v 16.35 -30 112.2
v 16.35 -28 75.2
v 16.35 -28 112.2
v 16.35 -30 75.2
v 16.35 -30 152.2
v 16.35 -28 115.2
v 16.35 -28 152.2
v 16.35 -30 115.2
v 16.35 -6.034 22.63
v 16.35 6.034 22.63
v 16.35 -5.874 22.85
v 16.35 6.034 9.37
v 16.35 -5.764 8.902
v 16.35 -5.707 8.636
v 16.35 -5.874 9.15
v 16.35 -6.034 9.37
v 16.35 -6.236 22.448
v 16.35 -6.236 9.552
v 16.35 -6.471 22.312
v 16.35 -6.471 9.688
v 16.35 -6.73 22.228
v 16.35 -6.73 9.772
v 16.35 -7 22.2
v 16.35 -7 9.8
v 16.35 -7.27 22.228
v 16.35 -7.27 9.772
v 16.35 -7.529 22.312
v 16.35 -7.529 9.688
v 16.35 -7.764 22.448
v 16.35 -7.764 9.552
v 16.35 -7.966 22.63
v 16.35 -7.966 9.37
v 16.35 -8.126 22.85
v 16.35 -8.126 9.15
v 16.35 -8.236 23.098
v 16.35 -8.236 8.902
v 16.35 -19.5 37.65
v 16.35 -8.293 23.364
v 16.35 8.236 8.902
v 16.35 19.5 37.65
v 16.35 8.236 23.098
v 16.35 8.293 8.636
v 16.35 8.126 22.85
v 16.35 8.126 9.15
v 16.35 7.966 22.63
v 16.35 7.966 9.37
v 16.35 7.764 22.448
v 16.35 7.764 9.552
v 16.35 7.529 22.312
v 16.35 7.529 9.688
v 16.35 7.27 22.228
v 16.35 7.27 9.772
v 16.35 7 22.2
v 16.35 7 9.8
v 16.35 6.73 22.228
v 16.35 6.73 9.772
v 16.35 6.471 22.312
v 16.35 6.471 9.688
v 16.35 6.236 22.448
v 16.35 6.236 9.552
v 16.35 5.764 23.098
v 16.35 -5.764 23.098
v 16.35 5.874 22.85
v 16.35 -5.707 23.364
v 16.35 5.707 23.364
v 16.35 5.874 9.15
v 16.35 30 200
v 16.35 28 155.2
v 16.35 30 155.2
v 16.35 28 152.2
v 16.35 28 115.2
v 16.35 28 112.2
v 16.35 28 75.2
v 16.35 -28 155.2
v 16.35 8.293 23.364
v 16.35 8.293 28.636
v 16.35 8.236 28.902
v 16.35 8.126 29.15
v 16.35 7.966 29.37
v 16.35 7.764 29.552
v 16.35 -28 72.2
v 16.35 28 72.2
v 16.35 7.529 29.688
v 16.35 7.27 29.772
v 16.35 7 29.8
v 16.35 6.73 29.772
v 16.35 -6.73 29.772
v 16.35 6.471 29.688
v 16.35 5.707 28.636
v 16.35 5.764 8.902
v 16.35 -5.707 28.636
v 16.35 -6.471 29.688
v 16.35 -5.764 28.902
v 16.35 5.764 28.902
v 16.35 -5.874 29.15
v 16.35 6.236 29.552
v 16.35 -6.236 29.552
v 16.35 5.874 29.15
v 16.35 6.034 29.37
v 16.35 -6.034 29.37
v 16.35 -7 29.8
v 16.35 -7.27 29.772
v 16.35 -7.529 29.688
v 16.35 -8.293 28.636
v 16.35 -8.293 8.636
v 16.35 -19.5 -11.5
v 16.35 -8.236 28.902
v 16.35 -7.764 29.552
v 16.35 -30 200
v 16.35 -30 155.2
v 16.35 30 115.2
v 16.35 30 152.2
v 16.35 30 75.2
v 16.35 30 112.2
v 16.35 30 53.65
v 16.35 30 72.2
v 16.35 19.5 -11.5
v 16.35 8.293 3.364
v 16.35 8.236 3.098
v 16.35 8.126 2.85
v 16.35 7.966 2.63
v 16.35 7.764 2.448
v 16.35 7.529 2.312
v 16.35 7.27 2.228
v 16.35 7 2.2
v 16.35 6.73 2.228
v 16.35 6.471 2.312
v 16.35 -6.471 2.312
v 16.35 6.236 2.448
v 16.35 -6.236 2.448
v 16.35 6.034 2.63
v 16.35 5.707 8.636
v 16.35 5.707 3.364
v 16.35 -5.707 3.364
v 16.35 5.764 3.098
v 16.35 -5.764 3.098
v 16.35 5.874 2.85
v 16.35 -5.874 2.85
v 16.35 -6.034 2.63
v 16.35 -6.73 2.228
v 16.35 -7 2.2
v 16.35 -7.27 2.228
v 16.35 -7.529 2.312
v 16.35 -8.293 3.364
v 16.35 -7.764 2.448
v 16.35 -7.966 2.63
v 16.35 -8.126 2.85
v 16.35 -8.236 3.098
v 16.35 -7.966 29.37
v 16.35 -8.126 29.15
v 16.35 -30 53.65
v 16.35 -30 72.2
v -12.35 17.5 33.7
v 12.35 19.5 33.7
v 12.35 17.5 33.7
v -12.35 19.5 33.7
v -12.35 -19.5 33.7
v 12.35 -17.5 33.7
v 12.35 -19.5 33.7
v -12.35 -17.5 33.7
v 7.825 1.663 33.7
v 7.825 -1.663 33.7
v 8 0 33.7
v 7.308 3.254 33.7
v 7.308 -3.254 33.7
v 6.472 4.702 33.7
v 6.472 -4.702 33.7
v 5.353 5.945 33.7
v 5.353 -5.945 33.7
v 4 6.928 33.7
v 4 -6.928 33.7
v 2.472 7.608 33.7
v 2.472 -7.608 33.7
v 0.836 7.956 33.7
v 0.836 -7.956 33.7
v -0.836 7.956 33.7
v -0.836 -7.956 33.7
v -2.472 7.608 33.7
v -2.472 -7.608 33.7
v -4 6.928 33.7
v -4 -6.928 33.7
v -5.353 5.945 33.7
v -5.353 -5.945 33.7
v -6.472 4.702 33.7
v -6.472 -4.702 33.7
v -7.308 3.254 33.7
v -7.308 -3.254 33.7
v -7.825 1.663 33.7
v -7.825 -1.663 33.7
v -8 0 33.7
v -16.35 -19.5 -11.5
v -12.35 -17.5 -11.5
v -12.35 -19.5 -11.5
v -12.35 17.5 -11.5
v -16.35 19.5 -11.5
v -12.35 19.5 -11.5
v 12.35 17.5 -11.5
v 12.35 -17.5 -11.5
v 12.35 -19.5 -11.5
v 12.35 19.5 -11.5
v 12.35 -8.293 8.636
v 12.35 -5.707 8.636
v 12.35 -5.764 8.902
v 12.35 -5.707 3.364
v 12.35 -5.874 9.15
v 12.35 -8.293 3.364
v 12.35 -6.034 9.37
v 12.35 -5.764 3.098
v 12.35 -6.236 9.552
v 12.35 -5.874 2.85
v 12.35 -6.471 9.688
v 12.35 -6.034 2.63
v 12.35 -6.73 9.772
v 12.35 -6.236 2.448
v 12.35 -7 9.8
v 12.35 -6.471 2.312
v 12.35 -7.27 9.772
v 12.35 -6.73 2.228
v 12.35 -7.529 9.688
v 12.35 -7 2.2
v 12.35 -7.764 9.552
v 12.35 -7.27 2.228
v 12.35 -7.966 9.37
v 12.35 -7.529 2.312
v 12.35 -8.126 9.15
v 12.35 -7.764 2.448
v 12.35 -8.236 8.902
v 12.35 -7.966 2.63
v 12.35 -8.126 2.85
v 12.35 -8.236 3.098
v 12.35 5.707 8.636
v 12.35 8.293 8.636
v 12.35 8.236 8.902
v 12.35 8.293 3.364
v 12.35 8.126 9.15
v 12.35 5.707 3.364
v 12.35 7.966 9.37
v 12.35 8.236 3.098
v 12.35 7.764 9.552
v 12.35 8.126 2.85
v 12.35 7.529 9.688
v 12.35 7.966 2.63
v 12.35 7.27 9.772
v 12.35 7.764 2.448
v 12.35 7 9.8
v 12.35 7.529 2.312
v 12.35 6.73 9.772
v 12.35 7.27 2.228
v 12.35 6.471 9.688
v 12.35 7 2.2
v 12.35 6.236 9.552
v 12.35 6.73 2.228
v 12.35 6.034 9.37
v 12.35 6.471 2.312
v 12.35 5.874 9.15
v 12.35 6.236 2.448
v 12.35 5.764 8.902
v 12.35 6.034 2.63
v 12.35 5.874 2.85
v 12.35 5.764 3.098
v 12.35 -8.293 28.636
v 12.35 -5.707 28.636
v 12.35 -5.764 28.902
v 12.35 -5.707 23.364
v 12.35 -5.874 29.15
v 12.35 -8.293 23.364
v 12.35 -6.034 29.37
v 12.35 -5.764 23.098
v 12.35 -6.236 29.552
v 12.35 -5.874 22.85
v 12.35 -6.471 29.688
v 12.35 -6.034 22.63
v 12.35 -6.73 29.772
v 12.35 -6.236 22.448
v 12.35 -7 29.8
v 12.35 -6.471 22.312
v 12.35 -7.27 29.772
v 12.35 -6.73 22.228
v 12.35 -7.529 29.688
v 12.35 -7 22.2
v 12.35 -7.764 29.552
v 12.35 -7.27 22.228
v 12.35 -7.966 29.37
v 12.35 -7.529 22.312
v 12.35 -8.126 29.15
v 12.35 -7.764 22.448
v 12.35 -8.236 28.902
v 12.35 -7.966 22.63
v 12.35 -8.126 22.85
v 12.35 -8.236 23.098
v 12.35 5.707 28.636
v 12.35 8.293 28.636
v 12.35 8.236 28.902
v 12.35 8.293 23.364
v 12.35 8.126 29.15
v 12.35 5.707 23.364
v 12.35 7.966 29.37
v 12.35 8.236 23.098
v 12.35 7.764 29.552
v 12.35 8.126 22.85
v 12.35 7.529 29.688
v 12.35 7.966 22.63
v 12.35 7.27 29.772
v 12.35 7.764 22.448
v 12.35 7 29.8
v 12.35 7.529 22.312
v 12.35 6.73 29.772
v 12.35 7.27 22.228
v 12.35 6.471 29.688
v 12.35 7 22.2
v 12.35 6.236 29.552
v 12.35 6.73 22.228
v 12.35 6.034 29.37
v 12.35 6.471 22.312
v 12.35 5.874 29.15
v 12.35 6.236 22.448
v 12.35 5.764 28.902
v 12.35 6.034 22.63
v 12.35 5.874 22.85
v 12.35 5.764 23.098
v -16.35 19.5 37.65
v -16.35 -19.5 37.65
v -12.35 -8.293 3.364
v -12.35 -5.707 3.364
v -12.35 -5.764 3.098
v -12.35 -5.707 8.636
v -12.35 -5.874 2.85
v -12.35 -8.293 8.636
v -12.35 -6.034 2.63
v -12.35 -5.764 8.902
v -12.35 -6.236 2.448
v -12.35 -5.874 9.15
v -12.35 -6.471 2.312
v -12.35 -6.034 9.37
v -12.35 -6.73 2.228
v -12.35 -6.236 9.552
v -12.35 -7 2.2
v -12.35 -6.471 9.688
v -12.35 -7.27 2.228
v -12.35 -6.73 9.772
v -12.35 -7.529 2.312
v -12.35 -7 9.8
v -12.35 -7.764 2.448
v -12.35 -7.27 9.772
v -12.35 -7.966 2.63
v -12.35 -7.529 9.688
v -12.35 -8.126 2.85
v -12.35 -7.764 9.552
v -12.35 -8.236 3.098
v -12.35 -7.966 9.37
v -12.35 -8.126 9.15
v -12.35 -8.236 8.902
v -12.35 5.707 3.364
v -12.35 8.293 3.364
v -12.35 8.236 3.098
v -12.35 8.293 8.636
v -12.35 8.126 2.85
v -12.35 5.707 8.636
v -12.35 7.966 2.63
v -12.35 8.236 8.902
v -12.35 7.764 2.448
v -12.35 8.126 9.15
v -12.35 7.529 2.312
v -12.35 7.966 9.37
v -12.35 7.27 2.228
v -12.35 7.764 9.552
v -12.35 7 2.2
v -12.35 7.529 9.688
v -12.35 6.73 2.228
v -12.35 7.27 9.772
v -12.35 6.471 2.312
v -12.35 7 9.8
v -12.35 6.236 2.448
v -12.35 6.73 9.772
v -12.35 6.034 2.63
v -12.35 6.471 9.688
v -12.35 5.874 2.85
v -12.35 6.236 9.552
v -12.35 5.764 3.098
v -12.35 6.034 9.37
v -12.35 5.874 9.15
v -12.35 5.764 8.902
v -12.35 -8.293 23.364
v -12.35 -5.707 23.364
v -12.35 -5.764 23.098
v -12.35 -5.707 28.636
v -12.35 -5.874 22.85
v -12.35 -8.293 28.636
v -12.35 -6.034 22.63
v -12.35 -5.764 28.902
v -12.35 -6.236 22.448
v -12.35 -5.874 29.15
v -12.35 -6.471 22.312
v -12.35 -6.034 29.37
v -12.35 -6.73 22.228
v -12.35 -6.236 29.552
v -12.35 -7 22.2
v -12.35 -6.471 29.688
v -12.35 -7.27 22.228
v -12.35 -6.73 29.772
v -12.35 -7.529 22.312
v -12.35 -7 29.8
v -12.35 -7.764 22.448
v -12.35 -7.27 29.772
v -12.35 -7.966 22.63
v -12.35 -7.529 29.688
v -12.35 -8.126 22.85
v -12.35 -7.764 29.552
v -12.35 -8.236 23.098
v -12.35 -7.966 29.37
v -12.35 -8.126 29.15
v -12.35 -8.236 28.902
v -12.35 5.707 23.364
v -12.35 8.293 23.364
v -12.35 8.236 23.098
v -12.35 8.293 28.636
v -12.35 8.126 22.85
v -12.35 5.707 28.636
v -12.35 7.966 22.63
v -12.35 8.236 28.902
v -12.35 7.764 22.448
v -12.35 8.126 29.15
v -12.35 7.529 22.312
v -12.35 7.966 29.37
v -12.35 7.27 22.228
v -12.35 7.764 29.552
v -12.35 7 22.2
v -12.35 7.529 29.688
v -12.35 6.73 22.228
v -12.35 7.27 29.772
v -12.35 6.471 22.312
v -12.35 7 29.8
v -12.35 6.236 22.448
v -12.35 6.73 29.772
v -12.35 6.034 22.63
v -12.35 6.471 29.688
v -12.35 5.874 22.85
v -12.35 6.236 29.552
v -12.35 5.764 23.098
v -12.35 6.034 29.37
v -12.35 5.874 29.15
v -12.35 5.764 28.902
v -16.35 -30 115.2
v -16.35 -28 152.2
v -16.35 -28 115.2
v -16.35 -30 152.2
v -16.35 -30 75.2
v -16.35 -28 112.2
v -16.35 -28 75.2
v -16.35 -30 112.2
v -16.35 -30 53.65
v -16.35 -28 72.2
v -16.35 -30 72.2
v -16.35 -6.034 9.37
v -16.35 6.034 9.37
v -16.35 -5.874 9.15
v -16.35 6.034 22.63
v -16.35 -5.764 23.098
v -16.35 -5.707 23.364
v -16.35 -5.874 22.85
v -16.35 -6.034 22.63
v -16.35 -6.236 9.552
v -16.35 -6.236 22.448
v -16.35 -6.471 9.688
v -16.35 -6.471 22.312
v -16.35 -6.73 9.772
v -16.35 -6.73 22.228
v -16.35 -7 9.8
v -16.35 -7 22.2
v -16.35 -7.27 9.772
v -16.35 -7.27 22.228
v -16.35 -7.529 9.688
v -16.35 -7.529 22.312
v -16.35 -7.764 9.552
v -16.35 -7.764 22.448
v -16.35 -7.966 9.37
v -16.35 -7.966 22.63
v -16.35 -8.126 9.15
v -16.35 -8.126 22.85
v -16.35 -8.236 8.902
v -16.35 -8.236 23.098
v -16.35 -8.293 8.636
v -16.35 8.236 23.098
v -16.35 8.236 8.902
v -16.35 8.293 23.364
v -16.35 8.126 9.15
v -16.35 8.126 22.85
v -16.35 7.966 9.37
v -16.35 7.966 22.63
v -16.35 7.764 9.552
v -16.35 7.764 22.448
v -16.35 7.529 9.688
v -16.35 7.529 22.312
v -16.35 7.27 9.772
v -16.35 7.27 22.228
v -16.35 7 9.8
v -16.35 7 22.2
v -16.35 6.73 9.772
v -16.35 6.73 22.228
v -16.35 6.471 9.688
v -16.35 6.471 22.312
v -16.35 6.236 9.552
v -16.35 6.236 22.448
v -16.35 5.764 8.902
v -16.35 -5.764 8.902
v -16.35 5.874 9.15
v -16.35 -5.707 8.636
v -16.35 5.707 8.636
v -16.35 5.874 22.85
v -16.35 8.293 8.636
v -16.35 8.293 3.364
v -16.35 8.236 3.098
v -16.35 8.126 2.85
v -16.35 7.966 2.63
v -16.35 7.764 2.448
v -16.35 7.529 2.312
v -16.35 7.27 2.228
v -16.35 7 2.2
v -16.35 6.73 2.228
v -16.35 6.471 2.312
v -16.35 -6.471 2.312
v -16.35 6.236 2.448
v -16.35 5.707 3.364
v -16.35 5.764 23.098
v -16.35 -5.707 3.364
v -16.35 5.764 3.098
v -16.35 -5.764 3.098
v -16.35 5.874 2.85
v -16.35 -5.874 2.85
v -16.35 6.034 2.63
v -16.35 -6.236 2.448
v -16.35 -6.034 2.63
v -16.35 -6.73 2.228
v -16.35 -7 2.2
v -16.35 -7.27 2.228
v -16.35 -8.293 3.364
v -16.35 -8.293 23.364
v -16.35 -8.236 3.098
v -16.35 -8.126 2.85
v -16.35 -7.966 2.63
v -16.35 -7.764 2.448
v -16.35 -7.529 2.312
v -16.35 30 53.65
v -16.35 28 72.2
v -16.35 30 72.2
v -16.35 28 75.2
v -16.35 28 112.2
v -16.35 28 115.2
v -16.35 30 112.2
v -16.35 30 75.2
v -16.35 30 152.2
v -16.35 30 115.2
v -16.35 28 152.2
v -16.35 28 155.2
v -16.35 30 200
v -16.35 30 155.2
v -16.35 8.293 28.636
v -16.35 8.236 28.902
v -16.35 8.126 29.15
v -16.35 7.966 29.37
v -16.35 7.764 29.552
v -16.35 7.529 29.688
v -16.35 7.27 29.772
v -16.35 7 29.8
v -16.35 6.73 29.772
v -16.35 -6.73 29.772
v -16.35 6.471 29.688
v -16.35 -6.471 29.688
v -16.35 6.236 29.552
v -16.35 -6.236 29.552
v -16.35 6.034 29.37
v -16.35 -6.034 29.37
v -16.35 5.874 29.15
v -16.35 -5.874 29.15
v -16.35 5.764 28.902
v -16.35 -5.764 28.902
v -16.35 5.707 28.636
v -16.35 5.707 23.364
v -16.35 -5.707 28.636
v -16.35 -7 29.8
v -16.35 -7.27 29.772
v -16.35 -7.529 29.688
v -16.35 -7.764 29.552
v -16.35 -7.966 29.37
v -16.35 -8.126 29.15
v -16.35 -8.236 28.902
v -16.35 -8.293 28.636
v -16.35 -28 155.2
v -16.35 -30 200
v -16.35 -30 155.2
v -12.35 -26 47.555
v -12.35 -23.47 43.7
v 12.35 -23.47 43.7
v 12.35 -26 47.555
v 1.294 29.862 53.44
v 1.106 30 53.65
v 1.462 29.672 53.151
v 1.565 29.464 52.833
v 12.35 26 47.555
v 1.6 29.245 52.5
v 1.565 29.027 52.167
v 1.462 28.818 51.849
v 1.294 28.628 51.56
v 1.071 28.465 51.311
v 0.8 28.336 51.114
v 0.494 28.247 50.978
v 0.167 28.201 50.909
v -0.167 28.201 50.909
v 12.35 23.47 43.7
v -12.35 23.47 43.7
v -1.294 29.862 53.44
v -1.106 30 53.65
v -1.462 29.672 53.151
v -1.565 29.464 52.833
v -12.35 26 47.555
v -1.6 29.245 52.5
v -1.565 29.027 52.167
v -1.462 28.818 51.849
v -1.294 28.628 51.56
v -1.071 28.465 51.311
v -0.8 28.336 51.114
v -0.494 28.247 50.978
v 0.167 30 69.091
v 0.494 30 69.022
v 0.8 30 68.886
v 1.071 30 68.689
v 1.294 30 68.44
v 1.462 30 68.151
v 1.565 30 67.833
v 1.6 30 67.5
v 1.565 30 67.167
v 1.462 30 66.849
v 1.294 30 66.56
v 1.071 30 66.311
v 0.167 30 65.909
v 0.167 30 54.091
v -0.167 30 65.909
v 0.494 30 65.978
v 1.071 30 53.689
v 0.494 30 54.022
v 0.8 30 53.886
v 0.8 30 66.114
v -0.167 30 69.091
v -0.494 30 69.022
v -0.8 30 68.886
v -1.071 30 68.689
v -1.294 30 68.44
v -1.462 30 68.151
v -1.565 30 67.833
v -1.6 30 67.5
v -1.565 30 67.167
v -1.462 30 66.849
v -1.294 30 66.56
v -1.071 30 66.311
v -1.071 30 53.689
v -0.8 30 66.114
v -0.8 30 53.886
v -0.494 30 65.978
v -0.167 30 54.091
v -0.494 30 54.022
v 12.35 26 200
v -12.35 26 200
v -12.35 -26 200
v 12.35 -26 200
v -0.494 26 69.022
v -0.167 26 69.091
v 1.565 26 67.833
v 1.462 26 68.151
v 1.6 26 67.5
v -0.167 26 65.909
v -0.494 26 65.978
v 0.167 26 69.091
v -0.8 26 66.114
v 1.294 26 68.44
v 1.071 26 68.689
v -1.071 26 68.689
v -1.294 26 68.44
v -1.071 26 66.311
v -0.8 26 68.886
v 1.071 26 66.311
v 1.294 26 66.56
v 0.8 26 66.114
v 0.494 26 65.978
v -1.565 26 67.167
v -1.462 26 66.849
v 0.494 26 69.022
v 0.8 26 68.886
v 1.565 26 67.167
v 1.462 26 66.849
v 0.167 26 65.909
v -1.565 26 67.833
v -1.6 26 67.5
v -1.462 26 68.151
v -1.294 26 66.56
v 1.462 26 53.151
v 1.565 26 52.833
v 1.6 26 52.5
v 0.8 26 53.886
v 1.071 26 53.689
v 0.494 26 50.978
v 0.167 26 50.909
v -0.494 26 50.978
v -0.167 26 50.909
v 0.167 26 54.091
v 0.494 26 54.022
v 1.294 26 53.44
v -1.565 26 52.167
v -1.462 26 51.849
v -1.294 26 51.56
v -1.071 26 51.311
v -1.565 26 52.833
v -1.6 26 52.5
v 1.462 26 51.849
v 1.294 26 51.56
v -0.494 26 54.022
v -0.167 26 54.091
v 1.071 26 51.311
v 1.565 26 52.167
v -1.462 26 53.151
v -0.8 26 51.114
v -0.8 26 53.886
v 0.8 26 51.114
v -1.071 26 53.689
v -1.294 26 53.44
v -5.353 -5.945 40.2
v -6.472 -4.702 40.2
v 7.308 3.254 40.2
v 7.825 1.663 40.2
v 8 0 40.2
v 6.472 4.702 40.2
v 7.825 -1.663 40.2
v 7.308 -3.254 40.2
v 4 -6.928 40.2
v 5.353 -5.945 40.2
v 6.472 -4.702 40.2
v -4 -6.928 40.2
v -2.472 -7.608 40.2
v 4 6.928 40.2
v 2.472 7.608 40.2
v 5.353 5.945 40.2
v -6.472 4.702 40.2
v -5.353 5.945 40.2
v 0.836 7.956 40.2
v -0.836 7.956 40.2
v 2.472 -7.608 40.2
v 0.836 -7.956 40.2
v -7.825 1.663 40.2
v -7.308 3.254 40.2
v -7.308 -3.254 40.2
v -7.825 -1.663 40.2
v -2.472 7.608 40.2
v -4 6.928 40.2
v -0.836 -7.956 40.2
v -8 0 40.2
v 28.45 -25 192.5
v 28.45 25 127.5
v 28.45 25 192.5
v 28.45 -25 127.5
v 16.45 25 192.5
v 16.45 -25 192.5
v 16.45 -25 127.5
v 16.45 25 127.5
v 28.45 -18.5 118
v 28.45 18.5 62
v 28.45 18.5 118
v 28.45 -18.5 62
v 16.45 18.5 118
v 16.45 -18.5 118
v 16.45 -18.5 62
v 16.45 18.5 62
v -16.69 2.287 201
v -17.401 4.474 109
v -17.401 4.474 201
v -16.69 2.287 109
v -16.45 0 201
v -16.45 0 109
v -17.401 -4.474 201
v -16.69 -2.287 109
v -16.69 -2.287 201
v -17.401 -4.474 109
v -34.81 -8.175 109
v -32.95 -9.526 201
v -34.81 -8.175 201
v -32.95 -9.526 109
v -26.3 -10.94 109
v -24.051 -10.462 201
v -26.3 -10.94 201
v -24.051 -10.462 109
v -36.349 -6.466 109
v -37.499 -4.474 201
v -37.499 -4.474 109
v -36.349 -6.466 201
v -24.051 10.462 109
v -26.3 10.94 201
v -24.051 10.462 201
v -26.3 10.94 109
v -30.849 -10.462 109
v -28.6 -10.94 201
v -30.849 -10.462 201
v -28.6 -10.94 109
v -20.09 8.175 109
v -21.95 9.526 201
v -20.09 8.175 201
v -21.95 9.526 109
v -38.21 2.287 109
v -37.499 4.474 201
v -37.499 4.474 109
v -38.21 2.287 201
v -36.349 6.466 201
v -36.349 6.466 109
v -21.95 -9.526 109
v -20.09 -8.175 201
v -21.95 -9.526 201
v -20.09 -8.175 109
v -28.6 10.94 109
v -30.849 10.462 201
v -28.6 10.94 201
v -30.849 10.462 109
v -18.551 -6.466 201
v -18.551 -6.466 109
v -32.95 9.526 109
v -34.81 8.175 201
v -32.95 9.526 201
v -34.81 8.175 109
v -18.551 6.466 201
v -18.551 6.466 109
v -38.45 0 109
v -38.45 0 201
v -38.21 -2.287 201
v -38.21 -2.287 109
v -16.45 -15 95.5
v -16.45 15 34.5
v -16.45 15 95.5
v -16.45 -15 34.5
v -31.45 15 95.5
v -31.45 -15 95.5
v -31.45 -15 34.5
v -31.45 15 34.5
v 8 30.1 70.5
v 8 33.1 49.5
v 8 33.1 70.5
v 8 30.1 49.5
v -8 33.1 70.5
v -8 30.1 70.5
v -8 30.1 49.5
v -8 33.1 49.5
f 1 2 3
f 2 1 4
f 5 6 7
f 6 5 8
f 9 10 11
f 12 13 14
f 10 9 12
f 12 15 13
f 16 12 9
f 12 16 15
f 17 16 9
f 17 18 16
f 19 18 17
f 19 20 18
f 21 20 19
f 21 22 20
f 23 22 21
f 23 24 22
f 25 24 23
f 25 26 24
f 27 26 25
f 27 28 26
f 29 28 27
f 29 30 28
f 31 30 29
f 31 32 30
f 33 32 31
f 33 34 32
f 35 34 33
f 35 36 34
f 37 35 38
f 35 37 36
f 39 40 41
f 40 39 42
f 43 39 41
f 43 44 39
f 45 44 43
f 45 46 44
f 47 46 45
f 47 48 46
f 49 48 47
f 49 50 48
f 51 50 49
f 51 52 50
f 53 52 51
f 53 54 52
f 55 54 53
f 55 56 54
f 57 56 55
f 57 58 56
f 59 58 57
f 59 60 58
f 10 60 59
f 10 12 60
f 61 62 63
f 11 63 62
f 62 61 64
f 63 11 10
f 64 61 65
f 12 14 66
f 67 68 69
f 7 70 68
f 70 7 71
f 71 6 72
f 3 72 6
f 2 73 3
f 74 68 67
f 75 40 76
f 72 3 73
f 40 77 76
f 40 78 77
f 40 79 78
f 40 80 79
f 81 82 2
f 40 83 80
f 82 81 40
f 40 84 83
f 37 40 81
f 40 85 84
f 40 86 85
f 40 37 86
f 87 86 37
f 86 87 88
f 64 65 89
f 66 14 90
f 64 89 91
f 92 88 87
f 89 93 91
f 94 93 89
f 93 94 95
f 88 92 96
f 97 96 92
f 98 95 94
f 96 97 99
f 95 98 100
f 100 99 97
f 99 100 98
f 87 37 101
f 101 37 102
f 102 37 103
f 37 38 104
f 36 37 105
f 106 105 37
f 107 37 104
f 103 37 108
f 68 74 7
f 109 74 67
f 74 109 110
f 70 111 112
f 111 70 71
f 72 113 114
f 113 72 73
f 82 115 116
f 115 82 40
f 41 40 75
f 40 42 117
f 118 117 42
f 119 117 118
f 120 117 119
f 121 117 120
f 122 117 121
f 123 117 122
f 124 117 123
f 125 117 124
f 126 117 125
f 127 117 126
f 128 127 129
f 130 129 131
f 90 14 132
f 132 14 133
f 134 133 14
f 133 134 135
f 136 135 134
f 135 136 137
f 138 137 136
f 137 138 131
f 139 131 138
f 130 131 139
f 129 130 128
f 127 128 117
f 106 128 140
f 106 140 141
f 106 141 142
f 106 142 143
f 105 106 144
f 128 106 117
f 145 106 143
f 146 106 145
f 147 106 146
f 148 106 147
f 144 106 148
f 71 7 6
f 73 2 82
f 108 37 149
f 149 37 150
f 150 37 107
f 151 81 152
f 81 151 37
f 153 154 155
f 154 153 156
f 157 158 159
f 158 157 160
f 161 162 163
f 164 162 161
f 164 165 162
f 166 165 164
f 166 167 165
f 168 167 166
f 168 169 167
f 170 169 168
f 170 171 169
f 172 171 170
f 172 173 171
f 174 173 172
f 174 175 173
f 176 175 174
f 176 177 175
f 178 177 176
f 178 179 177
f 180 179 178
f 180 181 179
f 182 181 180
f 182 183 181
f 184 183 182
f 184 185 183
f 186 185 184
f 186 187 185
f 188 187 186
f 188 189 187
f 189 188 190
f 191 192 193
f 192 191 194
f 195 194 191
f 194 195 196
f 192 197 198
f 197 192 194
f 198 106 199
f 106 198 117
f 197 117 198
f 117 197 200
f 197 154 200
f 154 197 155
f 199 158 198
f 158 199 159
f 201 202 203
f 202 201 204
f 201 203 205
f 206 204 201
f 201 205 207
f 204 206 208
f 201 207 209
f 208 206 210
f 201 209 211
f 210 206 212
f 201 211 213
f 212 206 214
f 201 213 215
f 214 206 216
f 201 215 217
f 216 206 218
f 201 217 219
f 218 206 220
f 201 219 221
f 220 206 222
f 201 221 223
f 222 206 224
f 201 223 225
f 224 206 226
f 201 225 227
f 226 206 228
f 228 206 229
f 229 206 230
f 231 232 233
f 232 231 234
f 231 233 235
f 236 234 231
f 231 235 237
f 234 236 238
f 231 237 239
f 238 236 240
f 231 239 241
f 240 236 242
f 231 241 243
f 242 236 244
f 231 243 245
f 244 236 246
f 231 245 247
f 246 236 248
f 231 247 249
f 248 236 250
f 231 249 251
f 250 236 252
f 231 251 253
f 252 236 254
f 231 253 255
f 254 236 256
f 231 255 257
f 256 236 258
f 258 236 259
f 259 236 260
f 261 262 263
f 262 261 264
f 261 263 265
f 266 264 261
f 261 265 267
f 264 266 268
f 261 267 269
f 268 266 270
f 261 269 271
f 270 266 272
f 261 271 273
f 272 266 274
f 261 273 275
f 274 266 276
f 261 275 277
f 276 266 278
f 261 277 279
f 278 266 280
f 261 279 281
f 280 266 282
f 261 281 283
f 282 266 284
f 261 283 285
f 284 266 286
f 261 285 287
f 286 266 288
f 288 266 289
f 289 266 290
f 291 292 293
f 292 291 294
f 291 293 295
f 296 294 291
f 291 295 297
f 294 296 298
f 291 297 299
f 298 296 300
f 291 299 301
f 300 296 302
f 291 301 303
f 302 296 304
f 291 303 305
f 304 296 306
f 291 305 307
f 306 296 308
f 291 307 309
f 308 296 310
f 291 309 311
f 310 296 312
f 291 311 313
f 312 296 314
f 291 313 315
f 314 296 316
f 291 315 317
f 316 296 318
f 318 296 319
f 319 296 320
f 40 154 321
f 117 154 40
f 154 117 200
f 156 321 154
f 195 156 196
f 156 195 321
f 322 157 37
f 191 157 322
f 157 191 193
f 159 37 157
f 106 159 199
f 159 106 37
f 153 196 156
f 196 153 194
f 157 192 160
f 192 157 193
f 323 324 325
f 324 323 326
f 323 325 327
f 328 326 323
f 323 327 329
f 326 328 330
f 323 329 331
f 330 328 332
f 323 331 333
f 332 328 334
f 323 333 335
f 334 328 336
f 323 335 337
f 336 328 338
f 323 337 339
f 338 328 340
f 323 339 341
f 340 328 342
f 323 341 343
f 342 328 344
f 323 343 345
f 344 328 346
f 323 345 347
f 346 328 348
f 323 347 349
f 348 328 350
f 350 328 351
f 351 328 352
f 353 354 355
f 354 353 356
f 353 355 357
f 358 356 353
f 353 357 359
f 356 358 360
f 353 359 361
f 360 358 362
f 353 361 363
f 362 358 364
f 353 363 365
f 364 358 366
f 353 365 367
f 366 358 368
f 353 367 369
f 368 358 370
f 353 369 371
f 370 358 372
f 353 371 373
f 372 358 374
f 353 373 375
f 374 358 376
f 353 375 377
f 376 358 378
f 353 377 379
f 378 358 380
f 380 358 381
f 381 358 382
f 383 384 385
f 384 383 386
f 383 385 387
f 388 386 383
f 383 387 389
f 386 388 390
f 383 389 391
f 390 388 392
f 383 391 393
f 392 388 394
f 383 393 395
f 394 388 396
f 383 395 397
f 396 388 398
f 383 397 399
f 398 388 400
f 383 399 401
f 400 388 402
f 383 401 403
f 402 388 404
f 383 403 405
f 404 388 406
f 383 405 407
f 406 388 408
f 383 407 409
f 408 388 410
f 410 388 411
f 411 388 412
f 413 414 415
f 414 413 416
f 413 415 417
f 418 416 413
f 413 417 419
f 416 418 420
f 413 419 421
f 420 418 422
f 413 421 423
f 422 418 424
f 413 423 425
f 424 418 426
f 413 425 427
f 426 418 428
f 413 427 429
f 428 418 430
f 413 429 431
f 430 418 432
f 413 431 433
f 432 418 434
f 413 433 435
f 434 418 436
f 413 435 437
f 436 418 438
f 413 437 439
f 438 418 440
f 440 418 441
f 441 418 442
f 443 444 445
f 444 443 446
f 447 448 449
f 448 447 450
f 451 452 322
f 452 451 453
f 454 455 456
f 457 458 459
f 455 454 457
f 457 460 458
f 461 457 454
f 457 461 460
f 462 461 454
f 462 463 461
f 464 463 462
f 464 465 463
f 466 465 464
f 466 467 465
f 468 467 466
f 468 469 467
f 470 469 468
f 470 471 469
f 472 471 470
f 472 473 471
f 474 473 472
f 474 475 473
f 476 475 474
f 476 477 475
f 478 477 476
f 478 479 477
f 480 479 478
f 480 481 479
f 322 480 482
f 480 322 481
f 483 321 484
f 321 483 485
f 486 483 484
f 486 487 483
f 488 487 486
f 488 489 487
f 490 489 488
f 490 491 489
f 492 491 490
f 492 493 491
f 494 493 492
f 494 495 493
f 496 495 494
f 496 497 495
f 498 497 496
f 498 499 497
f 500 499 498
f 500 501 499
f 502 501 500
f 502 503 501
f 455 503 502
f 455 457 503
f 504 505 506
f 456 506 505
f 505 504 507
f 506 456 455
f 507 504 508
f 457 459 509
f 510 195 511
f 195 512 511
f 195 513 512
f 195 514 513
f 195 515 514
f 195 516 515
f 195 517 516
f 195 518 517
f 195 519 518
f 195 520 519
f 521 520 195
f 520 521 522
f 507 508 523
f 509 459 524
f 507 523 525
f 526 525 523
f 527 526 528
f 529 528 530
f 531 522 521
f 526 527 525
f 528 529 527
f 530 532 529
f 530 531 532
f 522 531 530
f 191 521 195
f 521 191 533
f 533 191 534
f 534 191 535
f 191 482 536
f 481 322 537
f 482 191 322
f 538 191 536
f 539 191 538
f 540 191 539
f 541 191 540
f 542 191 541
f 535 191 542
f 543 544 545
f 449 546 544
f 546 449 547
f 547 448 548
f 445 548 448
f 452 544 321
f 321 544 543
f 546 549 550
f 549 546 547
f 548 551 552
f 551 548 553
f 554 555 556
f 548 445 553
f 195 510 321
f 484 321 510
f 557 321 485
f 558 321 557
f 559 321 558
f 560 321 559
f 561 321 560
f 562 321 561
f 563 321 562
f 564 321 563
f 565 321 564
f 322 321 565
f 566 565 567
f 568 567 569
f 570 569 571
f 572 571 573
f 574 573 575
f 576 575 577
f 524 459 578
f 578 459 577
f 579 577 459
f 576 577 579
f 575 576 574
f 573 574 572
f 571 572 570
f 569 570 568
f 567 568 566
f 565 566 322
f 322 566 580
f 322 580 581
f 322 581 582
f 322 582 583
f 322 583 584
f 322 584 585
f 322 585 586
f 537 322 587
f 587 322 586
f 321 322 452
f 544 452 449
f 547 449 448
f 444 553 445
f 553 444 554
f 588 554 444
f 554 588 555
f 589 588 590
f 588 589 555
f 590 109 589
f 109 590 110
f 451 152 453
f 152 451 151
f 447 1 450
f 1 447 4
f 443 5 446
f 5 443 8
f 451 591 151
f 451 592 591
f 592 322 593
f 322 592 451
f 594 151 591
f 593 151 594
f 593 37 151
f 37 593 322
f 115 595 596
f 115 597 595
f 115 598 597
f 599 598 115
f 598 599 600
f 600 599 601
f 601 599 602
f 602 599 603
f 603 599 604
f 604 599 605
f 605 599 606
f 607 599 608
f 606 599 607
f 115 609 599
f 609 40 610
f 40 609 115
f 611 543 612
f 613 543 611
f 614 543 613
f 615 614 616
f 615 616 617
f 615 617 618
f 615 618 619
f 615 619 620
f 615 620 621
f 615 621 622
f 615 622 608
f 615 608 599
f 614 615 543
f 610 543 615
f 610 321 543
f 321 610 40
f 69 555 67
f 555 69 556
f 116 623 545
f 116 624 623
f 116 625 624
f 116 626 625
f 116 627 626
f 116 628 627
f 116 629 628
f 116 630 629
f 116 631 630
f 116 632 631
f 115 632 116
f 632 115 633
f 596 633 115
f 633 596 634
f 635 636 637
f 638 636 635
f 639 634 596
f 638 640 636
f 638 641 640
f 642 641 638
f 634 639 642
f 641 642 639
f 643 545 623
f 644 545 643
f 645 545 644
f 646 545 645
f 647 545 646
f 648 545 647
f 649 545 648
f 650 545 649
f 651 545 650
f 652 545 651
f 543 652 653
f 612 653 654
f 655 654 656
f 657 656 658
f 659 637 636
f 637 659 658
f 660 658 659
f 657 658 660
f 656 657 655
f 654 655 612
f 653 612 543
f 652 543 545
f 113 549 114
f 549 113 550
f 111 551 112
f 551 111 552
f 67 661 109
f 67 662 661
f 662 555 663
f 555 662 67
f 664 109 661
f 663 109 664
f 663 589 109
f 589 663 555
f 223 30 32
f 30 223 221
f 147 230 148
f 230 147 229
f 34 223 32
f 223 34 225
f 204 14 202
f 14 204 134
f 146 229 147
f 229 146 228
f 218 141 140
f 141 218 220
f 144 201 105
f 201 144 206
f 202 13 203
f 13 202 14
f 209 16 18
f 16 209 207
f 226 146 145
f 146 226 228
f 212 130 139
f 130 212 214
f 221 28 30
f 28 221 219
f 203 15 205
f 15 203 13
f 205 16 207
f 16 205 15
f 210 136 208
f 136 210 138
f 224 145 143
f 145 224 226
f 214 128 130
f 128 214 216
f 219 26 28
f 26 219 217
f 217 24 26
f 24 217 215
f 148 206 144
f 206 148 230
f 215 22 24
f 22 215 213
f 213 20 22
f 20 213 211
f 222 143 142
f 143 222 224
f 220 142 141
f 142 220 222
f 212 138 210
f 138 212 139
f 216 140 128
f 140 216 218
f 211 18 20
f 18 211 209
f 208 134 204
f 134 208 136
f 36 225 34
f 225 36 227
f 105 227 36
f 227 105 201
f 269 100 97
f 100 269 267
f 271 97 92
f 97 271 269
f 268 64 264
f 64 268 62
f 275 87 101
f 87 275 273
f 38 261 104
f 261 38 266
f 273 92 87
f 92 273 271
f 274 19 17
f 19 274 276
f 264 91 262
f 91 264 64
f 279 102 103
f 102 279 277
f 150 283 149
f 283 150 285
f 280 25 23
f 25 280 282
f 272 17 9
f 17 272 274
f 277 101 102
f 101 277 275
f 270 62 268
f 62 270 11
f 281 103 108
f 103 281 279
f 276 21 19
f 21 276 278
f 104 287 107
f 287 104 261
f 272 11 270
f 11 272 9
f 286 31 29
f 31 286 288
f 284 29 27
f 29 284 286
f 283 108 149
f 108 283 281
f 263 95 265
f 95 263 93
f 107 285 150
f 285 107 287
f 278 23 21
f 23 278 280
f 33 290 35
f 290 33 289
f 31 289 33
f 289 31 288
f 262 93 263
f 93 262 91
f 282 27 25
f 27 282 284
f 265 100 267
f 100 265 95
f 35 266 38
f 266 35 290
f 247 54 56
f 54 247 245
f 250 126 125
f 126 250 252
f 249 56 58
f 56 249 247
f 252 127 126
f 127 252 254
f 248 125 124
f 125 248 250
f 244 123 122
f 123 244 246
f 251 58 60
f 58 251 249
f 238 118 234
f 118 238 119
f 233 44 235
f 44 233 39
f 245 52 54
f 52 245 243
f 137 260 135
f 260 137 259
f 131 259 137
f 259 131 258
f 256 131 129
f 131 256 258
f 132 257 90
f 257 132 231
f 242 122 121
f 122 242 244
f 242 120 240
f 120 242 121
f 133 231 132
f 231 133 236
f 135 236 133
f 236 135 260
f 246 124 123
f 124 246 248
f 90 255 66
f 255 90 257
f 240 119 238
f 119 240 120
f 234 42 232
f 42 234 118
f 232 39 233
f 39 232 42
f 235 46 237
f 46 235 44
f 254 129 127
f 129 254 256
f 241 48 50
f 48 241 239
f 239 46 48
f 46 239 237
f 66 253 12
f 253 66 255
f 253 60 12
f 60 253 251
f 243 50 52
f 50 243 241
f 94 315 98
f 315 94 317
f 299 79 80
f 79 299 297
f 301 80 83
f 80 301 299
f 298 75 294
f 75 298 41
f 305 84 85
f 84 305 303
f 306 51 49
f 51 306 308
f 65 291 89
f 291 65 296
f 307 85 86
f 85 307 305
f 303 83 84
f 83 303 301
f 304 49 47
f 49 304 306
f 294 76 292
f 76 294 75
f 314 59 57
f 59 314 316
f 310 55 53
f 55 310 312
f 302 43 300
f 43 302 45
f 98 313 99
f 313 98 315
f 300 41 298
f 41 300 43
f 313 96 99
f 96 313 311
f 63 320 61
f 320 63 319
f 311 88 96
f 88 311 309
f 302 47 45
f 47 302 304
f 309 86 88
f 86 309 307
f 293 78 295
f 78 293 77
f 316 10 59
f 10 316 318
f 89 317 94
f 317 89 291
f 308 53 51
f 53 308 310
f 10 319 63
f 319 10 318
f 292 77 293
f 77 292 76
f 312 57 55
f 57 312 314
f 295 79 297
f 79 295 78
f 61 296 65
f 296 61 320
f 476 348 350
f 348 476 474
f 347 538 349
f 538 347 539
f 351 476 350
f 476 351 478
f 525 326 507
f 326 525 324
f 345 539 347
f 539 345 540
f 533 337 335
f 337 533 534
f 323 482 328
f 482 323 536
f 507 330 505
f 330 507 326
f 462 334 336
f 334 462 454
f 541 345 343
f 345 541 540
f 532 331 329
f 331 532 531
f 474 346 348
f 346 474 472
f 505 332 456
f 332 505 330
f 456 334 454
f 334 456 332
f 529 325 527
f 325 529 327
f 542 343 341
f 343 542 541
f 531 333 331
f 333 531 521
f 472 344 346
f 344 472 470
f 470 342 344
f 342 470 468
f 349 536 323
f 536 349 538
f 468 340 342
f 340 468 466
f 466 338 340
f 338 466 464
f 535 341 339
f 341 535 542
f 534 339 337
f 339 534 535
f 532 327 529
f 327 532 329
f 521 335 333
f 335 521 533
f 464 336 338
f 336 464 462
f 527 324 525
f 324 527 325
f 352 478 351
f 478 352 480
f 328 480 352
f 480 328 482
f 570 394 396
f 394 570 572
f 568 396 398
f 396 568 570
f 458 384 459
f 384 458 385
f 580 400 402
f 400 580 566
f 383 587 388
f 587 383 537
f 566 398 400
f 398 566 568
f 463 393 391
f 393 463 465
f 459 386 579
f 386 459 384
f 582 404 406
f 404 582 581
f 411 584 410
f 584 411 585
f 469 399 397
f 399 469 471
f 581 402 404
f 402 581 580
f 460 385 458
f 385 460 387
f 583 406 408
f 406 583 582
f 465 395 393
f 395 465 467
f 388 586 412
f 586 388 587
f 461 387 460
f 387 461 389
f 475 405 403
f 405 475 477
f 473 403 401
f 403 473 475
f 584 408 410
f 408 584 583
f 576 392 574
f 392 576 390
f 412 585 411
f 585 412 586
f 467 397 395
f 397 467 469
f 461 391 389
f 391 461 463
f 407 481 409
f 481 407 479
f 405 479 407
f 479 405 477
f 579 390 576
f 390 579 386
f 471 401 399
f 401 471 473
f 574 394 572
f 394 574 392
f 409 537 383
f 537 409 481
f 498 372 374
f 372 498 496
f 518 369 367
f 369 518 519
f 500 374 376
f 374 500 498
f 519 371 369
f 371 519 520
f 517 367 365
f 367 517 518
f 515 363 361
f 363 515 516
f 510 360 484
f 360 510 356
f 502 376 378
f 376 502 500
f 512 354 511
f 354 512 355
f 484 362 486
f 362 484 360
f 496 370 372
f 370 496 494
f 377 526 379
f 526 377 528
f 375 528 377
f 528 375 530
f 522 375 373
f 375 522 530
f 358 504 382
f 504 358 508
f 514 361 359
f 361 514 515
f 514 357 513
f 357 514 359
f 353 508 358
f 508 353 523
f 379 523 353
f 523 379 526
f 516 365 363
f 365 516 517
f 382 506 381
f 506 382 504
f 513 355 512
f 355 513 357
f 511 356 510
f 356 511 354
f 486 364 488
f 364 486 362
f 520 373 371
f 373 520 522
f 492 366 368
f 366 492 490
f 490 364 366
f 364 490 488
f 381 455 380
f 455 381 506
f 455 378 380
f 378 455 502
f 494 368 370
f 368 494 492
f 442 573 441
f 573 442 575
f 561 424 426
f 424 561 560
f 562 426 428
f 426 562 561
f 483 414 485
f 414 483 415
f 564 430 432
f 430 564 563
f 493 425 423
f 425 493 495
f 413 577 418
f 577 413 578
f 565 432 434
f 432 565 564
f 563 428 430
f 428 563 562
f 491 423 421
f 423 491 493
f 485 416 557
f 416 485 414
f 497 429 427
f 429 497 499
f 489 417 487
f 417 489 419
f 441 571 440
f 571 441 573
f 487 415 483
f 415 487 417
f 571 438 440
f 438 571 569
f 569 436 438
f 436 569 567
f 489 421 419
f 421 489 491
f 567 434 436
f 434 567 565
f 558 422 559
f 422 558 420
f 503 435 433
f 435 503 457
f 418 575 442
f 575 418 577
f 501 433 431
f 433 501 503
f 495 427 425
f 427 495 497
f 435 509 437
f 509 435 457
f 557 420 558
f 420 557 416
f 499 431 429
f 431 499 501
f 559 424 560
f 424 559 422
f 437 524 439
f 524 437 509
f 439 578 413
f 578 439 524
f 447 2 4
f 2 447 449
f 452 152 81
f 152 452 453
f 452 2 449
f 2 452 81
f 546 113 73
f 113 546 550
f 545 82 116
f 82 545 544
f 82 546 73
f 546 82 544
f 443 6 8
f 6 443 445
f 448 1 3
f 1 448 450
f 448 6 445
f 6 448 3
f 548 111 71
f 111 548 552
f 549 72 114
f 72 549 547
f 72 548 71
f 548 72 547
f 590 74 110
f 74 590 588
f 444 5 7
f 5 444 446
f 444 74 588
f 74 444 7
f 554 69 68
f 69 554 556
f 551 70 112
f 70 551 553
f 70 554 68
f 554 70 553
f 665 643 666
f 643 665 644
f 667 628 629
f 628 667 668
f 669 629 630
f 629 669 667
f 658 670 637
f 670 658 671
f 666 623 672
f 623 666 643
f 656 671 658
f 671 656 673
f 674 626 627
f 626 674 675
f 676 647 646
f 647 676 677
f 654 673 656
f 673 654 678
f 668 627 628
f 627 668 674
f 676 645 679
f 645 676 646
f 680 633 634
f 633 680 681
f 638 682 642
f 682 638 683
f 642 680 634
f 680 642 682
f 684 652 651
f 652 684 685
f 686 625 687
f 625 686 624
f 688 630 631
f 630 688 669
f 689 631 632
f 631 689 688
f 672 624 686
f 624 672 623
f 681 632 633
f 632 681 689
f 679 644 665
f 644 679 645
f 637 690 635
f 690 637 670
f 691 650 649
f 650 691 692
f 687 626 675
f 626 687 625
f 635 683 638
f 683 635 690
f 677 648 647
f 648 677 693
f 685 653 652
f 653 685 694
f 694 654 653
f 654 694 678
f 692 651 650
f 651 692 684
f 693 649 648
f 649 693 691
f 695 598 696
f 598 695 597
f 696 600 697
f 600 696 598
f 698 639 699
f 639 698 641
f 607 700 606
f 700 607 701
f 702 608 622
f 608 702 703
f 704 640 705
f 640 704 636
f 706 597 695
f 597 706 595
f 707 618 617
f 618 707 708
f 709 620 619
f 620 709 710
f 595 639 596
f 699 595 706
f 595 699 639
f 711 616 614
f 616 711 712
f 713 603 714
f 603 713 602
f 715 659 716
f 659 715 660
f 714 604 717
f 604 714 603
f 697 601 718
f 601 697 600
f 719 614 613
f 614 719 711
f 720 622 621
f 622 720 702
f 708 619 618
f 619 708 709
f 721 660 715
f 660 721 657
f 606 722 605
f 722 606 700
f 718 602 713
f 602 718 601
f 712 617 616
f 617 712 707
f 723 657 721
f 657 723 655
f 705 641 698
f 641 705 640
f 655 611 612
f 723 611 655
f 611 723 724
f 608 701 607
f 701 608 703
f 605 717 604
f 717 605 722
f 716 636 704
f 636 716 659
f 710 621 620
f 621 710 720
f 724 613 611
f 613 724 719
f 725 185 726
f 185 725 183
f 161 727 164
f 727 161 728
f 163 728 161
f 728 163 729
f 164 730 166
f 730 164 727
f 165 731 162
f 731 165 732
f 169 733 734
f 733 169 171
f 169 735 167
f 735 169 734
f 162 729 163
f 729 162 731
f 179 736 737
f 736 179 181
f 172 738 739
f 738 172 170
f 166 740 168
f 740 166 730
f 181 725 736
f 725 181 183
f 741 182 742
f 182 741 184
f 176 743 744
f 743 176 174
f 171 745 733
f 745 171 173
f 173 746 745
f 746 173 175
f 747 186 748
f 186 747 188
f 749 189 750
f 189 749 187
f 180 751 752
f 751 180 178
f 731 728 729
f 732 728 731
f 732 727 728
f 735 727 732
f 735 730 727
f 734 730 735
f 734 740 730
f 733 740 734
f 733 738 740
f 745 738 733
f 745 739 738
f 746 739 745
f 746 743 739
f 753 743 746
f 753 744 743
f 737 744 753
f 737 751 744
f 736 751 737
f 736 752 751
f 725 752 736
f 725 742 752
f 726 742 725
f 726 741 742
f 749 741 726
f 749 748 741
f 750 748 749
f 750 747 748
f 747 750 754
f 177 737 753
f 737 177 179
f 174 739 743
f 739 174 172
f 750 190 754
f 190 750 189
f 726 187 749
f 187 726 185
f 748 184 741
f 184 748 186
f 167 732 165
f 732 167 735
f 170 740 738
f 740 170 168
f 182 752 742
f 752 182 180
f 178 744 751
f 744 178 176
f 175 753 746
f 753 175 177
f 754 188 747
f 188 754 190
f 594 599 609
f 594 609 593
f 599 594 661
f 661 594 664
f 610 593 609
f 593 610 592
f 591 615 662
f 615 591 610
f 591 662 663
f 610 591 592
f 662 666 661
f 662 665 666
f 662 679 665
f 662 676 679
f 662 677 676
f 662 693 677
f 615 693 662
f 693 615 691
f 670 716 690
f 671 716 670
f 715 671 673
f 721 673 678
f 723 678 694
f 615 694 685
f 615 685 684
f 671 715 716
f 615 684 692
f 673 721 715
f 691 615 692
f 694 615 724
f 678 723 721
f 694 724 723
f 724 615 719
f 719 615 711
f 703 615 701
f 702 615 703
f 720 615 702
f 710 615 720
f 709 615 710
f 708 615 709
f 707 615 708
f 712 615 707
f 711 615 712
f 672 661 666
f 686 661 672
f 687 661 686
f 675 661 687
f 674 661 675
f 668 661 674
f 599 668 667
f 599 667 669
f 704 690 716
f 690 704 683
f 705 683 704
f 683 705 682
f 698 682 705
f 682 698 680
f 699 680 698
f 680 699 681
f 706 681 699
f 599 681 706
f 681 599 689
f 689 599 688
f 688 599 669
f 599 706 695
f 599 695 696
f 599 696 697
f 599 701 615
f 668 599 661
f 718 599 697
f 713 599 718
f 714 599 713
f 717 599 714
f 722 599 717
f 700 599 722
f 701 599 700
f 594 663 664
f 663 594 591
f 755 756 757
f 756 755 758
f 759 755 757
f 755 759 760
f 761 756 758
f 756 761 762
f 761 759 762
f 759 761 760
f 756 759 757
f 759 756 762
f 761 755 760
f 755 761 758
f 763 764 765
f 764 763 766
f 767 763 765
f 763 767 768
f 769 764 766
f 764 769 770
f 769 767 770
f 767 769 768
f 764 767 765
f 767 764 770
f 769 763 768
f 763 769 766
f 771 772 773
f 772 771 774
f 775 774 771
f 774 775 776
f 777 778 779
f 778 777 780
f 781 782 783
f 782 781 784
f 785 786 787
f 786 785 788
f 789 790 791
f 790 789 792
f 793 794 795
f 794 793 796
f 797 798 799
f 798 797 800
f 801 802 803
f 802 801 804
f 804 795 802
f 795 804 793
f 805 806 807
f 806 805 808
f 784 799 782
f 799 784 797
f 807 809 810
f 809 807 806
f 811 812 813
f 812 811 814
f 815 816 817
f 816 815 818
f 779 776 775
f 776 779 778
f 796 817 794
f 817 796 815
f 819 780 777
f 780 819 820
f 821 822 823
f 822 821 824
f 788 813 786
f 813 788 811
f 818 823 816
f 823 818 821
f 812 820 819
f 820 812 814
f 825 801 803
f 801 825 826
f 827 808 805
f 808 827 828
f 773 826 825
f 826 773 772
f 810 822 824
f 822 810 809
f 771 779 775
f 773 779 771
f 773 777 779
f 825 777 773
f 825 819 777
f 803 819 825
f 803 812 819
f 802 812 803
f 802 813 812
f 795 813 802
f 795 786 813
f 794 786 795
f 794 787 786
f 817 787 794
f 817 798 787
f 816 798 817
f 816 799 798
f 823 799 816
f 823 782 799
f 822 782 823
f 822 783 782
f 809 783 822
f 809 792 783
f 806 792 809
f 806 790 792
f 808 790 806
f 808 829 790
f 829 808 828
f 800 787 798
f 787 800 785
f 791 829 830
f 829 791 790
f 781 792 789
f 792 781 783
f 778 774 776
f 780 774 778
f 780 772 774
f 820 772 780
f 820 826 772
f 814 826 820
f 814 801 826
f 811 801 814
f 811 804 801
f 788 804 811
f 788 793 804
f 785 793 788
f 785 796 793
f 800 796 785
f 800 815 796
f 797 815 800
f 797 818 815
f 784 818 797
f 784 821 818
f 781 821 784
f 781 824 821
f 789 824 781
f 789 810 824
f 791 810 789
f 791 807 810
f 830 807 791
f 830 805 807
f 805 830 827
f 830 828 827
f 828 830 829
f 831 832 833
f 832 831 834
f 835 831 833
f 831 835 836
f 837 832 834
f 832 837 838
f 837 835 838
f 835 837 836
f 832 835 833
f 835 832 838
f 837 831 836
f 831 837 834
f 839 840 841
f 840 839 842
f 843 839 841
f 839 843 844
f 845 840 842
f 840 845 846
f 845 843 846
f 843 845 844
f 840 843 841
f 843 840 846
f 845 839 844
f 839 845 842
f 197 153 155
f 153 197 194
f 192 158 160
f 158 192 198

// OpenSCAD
/*
  2026 전람회 "줄타기 밸런싱 로봇" - PyBullet 시뮬레이션 전용 모델
  - 목적: 물리 엔진(URDF) 업로드를 위한 강체(Rigid Body) Mesh 생성
  - export_mode = 1 : 상체 덩어리 (프레임+모터바디+보드x2+배터리x2+센서)
  - export_mode = 2 : 하체 덩어리 (프레임+금속브라켓+모터혼+센서)
  - 조치사항: 전선 및 가상의 나사 핀 제거, 부품 통짜 Union 병합
*/

$fn = 30; // 시뮬레이터 연산 부하를 줄이기 위해 곡면 해상도를 30으로 최적화

// ==========================================
// 🚀 STL Export 설정 (매우 중요)
// ==========================================
// ⭐ 1로 설정하고 F6 누른 뒤 STL 저장 -> upper_link.stl
// ⭐ 2로 설정하고 F6 누른 뒤 STL 저장 -> lower_link.stl
// (0으로 설정하면 조립된 모습을 미리보기 할 수 있습니다.)
export_mode = 1; 

// ==========================================
// ⚙️ 하드웨어 치수 파라미터 
// ==========================================
upper_length = 200; lower_length = 200; col_y_target = 60.0; 

// [모터 및 브라켓]
motor_x = 24.7; motor_y = 35.0; motor_z_up = 33.7; motor_z_down = 11.5; motor_z = 45.2;
m_hole_y = 14.0; m_hole_z_positions = [6.0, 26.0]; 
horn_d = 20.0; horn_h = 3.0;

b_inner_y = 42.0; b_w = 24.0; b_arm_l = 30.0; b_thick = 2.0; 
b_hole_x = 14.0; b_hole_y = 20.0; 
rope_d = 2.0; 

// [전자부품 실측]
esp_w = 50.0; esp_h = 65.0; esp_d = 12.0;
urt_w = 37.0; urt_h = 56.0; urt_d = 12.0;
bat_w = 30.0; bat_h = 61.0; bat_d = 15.0;
pb_d  = 22.0; pb_h  = 92.0;
mpu_w = 16.0; mpu_h = 21.0; mpu_d = 3.0;

plate_t = 4.0; 
up_x_fixed = motor_x + (plate_t * 2); 
low_x_fixed = b_w;                    
b_bot_z = -b_arm_l - b_thick;

// ==========================================
// 👁️ 메인 병합 로직
// ==========================================
if (export_mode == 1) {
    // [상체 강체 그룹]
    union() {
        upper_body_mesh();         
        motor_body_mesh();         
        upper_electronics_mesh();  
    }
} else if (export_mode == 2) {
    // [하체 강체 그룹]
    union() {
        lower_body_mesh();         
        bracket_mesh();            
        horn_mesh();               
        lower_electronics_mesh();  
    }
} else if (export_mode == 0) {
    // [어셈블리 미리보기]
    color("LightSkyBlue") { upper_body_mesh(); motor_body_mesh(); upper_electronics_mesh(); }
    color("DimGray") { lower_body_mesh(); bracket_mesh(); horn_mesh(); lower_electronics_mesh(); }
}

// ==========================================
// 🧱 세부 파트 모델링 (물리 충돌 특성 유지를 위해 뼈대 구멍은 보존)
// ==========================================
module upper_body_mesh() {
    difference() {
        union() {
            z_center = (motor_z_up - motor_z_down)/2;
            translate([motor_x/2 + plate_t/2, 0, z_center]) cube([plate_t, motor_y + 4, motor_z], center=true);
            translate([-motor_x/2 - plate_t/2, 0, z_center]) cube([plate_t, motor_y + 4, motor_z], center=true);
            translate([0, 0, motor_z_up + plate_t/2]) cube([up_x_fixed, motor_y + 4, plate_t], center=true);
            hull() {
                translate([0, 0, motor_z_up + plate_t]) cube([up_x_fixed, motor_y + 4, 0.1], center=true);
                translate([0, 0, motor_z_up + 20]) cube([up_x_fixed, col_y_target, 0.1], center=true);
            }
            h_len = upper_length - (motor_z_up + 20);
            translate([0, 0, motor_z_up + 20 + h_len/2]) cube([up_x_fixed, col_y_target, h_len], center=true);
        }
        for(x = [up_x_fixed/2, -up_x_fixed/2]) for(y = [-m_hole_y/2, m_hole_y/2]) for(z = m_hole_z_positions)
            hull() {
                translate([x, y, z - 2.5]) rotate([0, 90, 0]) cylinder(d=2.6, h=10, center=true);
                translate([x, y, z + 2.5]) rotate([0, 90, 0]) cylinder(d=2.6, h=10, center=true);
            }
        translate([0, 0, motor_z_up + plate_t/2]) cylinder(d=16, h=plate_t + 5, center=true);
        h_len2 = upper_length - (motor_z_up + 10);
        translate([0, 0, motor_z_up + 10 + h_len2/2]) cube([up_x_fixed - 8, col_y_target - 8, h_len2], center=true);
            
        for(z = [motor_z_up + 40 : 40 : upper_length - 20]) {
            translate([0, -col_y_target/2, z]) cube([up_x_fixed + 10, 4, 3], center=true);
            translate([0,  col_y_target/2, z]) cube([up_x_fixed + 10, 4, 3], center=true);
        }
        translate([0, col_y_target/2, 60]) {
            translate([0, 0, 7.5]) rotate([90, 0, 0]) cylinder(d=3.2, h=10, center=true);
            translate([0, 0, -7.5]) rotate([90, 0, 0]) cylinder(d=3.2, h=10, center=true);
        }
    }
}

module motor_body_mesh() {
    z_center = (motor_z_up - motor_z_down)/2;
    translate([0, 0, z_center]) cube([motor_x, motor_y, motor_z], center=true);
}

module upper_electronics_mesh() {
    translate([up_x_fixed/2 + esp_d/2 + 0.1, 0, 160]) cube([esp_d, esp_w, esp_h], center=true);
    translate([up_x_fixed/2 + urt_d/2 + 0.1, 0, 90]) cube([urt_d, urt_w, urt_h], center=true);
    translate([-up_x_fixed/2 - pb_d/2 - 0.1, 0, 155]) cylinder(d=pb_d, h=pb_h, center=true);
    translate([-up_x_fixed/2 - bat_d/2 - 0.1, 0, 65]) cube([bat_d, bat_w, bat_h], center=true);
    translate([0, col_y_target/2 + mpu_d/2 + 0.1, 60]) cube([mpu_w, mpu_d, mpu_h], center=true);
}

module lower_body_mesh() {
    translate([0, 0, b_bot_z])
    difference() {
        union() {
            translate([0, 0, -2]) cube([low_x_fixed, b_inner_y + b_thick*2, 4], center=true);
            hull() {
                translate([0, 0, -4]) cube([low_x_fixed, b_inner_y + b_thick*2, 0.1], center=true);
                translate([0, 0, -24]) cube([low_x_fixed, col_y_target, 0.1], center=true);
            }
            h_len = lower_length - 24;
            translate([0, 0, -24 - h_len/2]) cube([low_x_fixed, col_y_target, h_len], center=true);
        }
        for(x = [-b_hole_x/2, b_hole_x/2]) for(y = [-b_hole_y/2, b_hole_y/2])
            translate([x, y, -10]) cylinder(d=3.2, h=30, center=true);
            
        h_len2 = lower_length - 24 - 4; // 바닥 V홈 파임용 4mm 두께만 남기고 모두 파냄!
translate([0, 0, -24 - h_len2/2]) cube([low_x_fixed - 8, col_y_target - 8, h_len2], center=true);
        
        translate([0, 0, -lower_length - 1.5]) rotate([0, 45, 0]) cube([6, col_y_target + 10, 6], center=true);
        
        translate([0, col_y_target/2, -40]) {
            translate([0, 0, 7.5]) rotate([90, 0, 0]) cylinder(d=3.2, h=10, center=true);
            translate([0, 0, -7.5]) rotate([90, 0, 0]) cylinder(d=3.2, h=10, center=true);
        }
    }
}

module bracket_mesh() {
    difference() {
        translate([0, 0, b_bot_z + b_thick/2]) cube([b_w, b_inner_y + 2*b_thick, b_thick], center=true);
        for(x = [-b_hole_x/2, b_hole_x/2]) for(y = [-b_hole_y/2, b_hole_y/2])
            translate([x, y, b_bot_z + b_thick/2]) cylinder(d=3.5, h=10, center=true);
    }
    translate([0, b_inner_y/2 + b_thick/2, -b_arm_l/2]) cube([b_w, b_thick, b_arm_l], center=true);
    translate([0, -b_inner_y/2 - b_thick/2, -b_arm_l/2]) cube([b_w, b_thick, b_arm_l], center=true);
}

module horn_mesh() {
    translate([0, motor_y/2 + 1.5, 0]) rotate([90, 0, 0]) cylinder(d=horn_d, h=horn_h, center=true);
    translate([0, -motor_y/2 - 1.5, 0]) rotate([90, 0, 0]) cylinder(d=horn_d, h=horn_h, center=true);
}

module lower_electronics_mesh() {
    translate([0, col_y_target/2 + mpu_d/2 + 0.1, b_bot_z - 40]) cube([mpu_w, mpu_d, mpu_h], center=true);
}
